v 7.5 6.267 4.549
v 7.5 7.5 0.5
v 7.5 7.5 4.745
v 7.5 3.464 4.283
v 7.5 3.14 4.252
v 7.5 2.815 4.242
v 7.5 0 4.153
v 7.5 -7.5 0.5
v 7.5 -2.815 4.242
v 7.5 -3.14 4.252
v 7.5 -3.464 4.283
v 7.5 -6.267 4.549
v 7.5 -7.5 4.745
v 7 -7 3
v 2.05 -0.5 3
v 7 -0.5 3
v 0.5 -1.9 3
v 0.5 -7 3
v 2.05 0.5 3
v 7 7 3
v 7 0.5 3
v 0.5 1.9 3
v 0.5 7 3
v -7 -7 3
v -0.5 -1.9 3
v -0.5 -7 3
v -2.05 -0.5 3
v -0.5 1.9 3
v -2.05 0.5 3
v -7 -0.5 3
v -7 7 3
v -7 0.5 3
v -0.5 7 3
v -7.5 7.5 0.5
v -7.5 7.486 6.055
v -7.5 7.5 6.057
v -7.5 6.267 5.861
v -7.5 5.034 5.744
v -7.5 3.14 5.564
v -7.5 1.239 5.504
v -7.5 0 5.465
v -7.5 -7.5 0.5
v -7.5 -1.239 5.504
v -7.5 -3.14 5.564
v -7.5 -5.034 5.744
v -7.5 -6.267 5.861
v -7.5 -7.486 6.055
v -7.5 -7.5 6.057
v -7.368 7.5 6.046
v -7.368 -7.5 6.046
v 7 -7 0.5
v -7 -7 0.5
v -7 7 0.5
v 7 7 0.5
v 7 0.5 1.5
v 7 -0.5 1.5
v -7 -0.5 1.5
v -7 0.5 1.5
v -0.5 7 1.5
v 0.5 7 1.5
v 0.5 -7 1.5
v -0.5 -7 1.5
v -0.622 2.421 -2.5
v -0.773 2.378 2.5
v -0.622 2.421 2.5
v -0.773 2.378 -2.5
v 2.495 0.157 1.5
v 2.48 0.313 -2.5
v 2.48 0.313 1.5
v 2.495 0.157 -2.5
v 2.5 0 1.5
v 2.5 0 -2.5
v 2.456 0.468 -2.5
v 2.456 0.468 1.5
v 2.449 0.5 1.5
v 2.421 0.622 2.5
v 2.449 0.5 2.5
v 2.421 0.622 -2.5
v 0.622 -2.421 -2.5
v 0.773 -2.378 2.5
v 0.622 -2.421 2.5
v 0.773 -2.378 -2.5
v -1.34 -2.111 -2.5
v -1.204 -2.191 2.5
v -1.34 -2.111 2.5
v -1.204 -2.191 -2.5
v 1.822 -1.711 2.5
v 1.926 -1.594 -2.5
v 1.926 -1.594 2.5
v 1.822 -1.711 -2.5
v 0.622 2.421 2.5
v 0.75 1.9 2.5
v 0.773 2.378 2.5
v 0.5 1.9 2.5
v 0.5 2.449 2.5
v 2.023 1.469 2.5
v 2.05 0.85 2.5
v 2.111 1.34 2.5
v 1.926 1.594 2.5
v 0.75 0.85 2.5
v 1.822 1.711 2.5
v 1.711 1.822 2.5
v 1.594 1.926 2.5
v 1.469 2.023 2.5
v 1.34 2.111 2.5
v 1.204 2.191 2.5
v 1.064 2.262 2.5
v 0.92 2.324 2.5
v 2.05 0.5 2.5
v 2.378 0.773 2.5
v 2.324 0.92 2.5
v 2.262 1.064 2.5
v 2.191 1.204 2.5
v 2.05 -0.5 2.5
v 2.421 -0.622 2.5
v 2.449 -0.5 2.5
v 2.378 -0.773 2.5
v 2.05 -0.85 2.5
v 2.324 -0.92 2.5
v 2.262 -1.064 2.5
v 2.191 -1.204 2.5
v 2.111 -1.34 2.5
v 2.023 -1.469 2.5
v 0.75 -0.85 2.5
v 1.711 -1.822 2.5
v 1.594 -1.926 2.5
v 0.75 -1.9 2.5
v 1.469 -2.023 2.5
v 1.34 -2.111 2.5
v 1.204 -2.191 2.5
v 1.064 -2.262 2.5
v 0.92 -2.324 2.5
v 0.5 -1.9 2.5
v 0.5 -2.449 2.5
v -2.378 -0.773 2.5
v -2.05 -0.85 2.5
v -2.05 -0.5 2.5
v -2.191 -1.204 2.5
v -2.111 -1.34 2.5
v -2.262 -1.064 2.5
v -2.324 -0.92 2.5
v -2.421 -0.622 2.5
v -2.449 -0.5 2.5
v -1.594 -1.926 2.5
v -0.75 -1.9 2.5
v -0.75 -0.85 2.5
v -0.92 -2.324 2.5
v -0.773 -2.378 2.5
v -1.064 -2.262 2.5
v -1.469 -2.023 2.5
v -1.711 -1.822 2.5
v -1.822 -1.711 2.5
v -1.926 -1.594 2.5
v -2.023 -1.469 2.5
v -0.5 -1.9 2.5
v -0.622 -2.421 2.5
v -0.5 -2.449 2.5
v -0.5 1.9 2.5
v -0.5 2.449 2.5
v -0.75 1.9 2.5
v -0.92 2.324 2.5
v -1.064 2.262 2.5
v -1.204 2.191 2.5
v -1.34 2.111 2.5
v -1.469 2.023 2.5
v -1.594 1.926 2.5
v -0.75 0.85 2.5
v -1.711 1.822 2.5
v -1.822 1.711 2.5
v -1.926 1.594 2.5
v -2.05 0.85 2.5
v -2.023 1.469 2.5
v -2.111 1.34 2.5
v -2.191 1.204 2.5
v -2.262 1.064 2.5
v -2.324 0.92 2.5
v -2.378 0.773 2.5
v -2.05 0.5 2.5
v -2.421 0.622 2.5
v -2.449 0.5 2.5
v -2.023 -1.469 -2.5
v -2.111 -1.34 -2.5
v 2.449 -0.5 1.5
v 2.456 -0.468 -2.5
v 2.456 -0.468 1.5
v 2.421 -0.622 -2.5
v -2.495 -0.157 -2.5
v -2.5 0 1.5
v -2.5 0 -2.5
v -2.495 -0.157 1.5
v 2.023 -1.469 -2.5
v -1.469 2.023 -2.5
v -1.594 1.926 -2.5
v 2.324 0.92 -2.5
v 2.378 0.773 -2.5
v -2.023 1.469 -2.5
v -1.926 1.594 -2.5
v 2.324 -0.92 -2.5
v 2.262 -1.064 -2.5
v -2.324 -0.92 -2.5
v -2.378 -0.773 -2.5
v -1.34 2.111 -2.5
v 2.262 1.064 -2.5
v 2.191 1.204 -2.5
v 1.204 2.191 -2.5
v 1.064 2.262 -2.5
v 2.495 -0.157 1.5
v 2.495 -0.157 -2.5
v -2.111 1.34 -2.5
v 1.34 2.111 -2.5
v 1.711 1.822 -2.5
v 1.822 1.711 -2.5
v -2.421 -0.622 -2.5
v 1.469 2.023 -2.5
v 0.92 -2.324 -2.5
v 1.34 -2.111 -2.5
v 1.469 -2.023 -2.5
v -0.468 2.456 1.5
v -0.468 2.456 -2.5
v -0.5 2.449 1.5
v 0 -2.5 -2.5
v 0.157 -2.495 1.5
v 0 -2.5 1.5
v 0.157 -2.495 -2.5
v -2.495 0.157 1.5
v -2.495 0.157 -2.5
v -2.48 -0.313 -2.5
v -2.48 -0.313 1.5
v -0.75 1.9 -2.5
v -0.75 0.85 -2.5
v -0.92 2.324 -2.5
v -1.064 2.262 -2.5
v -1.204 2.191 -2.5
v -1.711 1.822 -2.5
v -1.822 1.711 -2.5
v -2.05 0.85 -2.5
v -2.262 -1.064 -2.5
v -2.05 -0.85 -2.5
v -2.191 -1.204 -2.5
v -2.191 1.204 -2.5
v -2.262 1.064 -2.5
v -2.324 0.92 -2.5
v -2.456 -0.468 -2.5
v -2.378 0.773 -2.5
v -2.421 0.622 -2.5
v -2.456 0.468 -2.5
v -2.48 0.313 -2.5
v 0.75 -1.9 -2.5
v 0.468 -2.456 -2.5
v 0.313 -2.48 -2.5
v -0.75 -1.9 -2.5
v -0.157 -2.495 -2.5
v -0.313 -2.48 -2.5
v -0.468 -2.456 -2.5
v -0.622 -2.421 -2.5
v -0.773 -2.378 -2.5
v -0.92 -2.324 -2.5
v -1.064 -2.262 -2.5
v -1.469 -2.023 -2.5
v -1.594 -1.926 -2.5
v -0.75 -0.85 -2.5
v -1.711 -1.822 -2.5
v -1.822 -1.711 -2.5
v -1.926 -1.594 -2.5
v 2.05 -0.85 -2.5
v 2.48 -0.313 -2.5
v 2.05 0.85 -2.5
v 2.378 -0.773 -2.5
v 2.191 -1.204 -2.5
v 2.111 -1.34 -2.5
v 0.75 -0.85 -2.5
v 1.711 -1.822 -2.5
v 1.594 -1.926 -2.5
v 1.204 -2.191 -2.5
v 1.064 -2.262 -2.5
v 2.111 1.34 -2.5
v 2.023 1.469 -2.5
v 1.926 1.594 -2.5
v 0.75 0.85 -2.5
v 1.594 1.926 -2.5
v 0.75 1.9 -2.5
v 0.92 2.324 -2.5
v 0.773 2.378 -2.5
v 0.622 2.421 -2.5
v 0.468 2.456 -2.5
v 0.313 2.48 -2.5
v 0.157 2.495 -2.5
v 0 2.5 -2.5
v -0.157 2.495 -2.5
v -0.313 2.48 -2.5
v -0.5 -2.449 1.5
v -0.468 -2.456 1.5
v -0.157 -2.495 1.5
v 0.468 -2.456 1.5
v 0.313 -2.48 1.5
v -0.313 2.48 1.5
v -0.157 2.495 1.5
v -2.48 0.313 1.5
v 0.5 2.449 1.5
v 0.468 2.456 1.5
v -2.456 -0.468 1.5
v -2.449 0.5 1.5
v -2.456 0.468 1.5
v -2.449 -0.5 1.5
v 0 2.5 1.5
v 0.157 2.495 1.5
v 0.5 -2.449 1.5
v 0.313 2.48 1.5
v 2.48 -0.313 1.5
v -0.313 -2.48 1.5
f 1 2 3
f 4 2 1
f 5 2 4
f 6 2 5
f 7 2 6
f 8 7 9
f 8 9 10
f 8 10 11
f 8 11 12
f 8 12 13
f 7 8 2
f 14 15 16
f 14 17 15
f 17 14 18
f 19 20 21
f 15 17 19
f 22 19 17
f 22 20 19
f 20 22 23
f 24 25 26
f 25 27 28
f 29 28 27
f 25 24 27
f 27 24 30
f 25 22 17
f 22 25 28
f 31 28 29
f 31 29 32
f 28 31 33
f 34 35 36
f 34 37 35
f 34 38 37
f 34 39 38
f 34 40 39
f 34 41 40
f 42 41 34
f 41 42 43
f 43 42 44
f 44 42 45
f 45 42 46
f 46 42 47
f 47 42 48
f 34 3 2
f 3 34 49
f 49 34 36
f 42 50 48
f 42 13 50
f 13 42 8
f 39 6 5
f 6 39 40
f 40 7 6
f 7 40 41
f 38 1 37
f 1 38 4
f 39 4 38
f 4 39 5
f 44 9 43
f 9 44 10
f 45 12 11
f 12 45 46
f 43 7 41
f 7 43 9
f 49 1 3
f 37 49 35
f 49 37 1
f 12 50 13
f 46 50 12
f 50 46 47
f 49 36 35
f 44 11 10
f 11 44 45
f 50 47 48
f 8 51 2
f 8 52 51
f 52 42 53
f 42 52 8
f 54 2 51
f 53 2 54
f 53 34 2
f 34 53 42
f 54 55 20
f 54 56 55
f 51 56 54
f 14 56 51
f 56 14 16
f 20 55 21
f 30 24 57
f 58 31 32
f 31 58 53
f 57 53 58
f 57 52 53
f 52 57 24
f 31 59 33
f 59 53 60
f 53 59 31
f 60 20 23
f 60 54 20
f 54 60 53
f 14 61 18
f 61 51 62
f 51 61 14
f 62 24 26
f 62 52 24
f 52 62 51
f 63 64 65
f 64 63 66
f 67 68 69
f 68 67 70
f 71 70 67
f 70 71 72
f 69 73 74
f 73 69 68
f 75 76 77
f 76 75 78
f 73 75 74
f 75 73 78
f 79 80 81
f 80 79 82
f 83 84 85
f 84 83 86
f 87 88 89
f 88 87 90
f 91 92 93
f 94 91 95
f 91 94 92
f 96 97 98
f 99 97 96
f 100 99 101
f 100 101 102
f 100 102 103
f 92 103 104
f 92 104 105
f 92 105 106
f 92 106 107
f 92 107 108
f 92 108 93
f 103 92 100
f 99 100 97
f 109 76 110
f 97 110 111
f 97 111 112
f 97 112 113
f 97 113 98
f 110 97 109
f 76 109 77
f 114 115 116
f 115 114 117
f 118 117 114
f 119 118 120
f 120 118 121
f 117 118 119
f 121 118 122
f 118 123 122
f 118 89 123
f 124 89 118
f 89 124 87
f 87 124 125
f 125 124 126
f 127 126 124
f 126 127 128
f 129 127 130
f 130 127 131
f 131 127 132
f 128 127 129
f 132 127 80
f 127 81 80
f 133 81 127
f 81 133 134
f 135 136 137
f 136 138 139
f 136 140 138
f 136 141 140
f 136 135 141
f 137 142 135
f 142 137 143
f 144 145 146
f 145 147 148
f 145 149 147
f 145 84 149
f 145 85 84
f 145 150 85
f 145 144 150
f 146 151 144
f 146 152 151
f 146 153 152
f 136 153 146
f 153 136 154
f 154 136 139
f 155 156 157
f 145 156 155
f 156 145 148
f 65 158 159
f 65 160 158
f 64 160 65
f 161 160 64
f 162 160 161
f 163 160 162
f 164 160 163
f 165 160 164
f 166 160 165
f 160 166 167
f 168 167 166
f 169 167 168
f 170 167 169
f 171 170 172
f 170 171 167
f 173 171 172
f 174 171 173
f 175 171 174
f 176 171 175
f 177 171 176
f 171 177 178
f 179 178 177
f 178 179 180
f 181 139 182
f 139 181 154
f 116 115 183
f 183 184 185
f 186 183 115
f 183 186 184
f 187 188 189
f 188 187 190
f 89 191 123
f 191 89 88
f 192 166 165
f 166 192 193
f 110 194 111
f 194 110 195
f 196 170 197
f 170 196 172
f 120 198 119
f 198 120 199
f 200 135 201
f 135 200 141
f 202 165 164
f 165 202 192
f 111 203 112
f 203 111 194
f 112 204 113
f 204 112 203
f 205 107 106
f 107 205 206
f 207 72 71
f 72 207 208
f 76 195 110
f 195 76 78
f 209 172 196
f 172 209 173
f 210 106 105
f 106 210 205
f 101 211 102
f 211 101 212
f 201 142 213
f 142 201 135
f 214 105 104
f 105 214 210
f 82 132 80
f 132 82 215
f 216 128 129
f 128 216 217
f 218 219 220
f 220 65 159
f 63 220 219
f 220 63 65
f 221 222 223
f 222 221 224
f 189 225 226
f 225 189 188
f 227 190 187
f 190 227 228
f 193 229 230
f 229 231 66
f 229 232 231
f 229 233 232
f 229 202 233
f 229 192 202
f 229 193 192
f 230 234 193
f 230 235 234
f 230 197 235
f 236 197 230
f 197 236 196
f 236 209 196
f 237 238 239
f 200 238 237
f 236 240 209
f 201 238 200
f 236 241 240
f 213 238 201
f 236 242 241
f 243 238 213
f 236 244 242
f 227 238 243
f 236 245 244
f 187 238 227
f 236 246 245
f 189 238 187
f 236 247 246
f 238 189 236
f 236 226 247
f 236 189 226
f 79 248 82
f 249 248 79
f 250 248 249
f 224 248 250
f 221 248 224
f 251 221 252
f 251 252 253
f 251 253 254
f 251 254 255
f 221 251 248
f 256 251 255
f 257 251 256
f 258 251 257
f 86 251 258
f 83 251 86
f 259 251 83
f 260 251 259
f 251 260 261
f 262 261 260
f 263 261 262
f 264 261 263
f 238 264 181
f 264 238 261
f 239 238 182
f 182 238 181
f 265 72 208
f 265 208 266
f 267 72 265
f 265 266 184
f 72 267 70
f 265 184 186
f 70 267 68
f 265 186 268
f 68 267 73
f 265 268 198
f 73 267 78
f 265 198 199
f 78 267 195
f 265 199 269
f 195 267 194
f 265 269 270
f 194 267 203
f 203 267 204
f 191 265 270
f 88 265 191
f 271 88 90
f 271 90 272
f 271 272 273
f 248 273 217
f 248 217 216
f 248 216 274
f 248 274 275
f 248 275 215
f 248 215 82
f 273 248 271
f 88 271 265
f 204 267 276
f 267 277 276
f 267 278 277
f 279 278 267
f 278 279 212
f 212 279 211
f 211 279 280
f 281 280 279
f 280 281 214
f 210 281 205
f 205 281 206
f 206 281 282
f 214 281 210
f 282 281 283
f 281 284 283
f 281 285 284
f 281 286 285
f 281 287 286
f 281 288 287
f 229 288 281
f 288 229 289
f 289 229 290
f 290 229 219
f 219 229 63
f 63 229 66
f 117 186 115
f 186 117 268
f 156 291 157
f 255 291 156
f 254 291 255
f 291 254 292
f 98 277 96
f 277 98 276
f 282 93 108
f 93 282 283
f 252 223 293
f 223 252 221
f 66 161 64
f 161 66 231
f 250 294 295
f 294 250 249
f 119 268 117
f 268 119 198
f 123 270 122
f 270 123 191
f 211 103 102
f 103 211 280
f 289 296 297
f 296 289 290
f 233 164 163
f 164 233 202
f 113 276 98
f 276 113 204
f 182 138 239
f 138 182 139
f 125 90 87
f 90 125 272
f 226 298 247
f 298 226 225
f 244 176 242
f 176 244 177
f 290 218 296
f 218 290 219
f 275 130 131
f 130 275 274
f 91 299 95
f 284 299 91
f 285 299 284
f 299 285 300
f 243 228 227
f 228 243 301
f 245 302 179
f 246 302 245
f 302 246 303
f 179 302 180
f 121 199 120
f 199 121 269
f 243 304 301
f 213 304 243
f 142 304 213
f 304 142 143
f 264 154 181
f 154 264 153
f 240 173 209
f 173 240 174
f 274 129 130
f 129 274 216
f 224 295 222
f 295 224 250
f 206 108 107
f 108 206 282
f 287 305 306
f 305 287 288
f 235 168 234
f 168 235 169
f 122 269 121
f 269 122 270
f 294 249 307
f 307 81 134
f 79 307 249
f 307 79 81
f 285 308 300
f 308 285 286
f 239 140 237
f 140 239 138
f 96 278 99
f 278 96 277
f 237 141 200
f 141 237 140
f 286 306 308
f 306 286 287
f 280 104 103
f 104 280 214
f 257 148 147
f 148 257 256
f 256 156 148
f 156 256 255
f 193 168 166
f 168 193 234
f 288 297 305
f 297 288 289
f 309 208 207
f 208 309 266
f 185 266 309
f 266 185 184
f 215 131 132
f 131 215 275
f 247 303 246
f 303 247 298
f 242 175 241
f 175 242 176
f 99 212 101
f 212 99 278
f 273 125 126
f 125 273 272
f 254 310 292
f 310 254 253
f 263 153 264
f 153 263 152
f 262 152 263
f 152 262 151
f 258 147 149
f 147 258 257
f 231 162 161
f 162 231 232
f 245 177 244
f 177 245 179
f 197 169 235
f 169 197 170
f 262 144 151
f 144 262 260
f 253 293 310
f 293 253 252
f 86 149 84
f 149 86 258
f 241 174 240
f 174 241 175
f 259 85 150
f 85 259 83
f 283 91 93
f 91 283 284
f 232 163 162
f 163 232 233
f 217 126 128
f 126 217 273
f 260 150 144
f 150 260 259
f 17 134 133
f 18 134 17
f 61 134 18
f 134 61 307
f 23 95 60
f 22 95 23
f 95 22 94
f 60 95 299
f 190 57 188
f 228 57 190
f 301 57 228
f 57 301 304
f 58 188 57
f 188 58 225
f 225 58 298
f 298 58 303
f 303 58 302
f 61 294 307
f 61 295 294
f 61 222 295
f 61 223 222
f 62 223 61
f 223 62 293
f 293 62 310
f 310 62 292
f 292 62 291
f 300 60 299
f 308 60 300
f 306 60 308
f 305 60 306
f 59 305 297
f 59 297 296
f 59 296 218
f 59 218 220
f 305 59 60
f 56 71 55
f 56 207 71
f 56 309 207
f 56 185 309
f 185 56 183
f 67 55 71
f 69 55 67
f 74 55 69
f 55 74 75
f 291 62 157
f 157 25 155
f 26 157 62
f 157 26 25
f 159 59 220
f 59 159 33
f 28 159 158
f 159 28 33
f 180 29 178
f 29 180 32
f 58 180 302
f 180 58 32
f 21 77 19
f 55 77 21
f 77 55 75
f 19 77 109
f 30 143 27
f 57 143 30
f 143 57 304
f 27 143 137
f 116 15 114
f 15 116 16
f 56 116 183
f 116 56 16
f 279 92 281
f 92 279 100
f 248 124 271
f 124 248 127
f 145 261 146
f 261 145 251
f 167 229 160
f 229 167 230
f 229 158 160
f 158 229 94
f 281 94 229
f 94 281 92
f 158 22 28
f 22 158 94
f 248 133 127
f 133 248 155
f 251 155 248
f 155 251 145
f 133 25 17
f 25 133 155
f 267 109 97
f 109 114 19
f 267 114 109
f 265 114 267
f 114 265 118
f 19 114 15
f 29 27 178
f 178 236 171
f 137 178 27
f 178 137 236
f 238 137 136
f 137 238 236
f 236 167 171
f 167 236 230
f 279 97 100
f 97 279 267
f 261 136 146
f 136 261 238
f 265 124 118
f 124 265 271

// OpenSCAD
$fn=100;

HeadWidth=15;

//键帽的头部
module head(headwidth)
{
    union()
    {
        difference(){
            cube([headwidth,headwidth,10],center=true);
            translate([0,0,47])rotate([0,95,0])cylinder(r=50,h=30,center=true);
        }
        translate([0,0,-6]) difference(){
            cube([headwidth,headwidth,3],center=true);
            cube([headwidth-1,headwidth-1,3],center=true);
        }
    }
}

//接口处
module foot(headwidth)
{
    difference()
    {
        //圆柱体和横梁
        union()
        {
            cylinder(h=5,r=2.5,center=true);
            translate([0,0,2.5])cube([1,headwidth,2],center=true);
            translate([0,0,2.5])cube([headwidth,1,2],center=true);
        }
        //两个插槽
        union(){
            cube([1.5,3.8,10],center=true);
            cube([4.1,1.7,10],center=true);
        }
    }
}

union()
{
    translate([0,0,8])head(HeadWidth);
    foot(HeadWidth);
}
